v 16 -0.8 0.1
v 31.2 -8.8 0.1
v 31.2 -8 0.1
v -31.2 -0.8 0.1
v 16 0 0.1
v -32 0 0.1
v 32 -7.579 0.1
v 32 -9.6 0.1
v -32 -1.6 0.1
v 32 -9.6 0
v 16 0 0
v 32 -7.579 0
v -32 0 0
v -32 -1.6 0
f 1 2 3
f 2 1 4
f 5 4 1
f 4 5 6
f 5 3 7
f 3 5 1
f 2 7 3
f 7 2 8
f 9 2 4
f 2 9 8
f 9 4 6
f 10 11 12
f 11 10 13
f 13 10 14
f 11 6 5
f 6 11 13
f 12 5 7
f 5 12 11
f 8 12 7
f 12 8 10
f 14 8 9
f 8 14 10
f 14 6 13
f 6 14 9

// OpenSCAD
use <../lib.scad>
function ldraw_lib__820675b() = [
// 0 Sticker  1.2 x  8 Triangle Yellow with Transparent Border Left
// 0 Name: 820675b.dat
// 0 Author: Miklos Hosszu [hmick]
// 0 !LDRAW_ORG Part UPDATE 2014-01
// 0 !LICENSE Licensed under CC BY 2.0 and CC BY 4.0 : see CAreadme.txt
// 
// 0 BFC CERTIFY CCW
  [0,"BFC","CERTIFY"],
  [0,"BFC","CCW"],
// 
// 0 !KEYWORDS Dark Shark, Nautica, set 6679
// 
// 0 !HISTORY 2006-08-29 [WilliamH] Swapped colour 16 to colour 0
// 0 !HISTORY 2014-01-25 [MagFors] Unswapped colours
// 0 !HISTORY 2014-06-21 [PTadmin] Official Update 2014-01
// 
// 
// 4 14 -78 -0.25 -2 78 -0.25 -22 78 -0.25 -20 40 -0.25 -2
  [4,14,-78,-0.25,-2,78,-0.25,-22,78,-0.25,-20,40,-0.25,-2],
// 4 16 -78 -0.25 -2 40 -0.25 -2 40 -0.25 0 -80 -0.25 0
  [4,16,-78,-0.25,-2,40,-0.25,-2,40,-0.25,0,-80,-0.25,0],
// 4 16 40 -0.25 0 40 -0.25 -2 78 -0.25 -20 80 -0.25 -18.9474
  [4,16,40,-0.25,0,40,-0.25,-2,78,-0.25,-20,80,-0.25,-18.9474],
// 4 16 80 -0.25 -18.9474 78 -0.25 -20 78 -0.25 -22 80 -0.25 -24
  [4,16,80,-0.25,-18.9474,78,-0.25,-20,78,-0.25,-22,80,-0.25,-24],
// 4 16 80 -0.25 -24 78 -0.25 -22 -78 -0.25 -2 -80 -0.25 -4
  [4,16,80,-0.25,-24,78,-0.25,-22,-78,-0.25,-2,-80,-0.25,-4],
// 3 16 -80 -0.25 -4 -78 -0.25 -2 -80 -0.25 0
  [3,16,-80,-0.25,-4,-78,-0.25,-2,-80,-0.25,0],
// 
// 4 16 -80 0 0 40 0 0 80 0 -18.9474 80 0 -24
  [4,16,-80,0,0,40,0,0,80,0,-18.9474,80,0,-24],
// 3 16 -80 0 0 80 0 -24 -80 0 -4
  [3,16,-80,0,0,80,0,-24,-80,0,-4],
// 
// 4 16 -80 0 0 -80 -0.25 0 40 -0.25 0 40 0 0
  [4,16,-80,0,0,-80,-0.25,0,40,-0.25,0,40,0,0],
// 4 16 40 0 0 40 -0.25 0 80 -0.25 -18.9474 80 0 -18.9474
  [4,16,40,0,0,40,-0.25,0,80,-0.25,-18.9474,80,0,-18.9474],
// 4 16 80 0 -18.9474 80 -0.25 -18.9474 80 -0.25 -24 80 0 -24
  [4,16,80,0,-18.9474,80,-0.25,-18.9474,80,-0.25,-24,80,0,-24],
// 4 16 80 0 -24 80 -0.25 -24 -80 -0.25 -4 -80 0 -4
  [4,16,80,0,-24,80,-0.25,-24,-80,-0.25,-4,-80,0,-4],
// 4 16 -80 0 -4 -80 -0.25 -4 -80 -0.25 0 -80 0 0
  [4,16,-80,0,-4,-80,-0.25,-4,-80,-0.25,0,-80,0,0],
// 
];
module ldraw_lib__820675b(step=0, col=false, unit=2/5, alt=false, line=0.2, solid=!$preview)
    makepoly(ldraw_lib__820675b(), step=step, col=col, unit=unit, alt=alt, line=line, solid=solid);
ldraw_lib__820675b(line=0.2);
